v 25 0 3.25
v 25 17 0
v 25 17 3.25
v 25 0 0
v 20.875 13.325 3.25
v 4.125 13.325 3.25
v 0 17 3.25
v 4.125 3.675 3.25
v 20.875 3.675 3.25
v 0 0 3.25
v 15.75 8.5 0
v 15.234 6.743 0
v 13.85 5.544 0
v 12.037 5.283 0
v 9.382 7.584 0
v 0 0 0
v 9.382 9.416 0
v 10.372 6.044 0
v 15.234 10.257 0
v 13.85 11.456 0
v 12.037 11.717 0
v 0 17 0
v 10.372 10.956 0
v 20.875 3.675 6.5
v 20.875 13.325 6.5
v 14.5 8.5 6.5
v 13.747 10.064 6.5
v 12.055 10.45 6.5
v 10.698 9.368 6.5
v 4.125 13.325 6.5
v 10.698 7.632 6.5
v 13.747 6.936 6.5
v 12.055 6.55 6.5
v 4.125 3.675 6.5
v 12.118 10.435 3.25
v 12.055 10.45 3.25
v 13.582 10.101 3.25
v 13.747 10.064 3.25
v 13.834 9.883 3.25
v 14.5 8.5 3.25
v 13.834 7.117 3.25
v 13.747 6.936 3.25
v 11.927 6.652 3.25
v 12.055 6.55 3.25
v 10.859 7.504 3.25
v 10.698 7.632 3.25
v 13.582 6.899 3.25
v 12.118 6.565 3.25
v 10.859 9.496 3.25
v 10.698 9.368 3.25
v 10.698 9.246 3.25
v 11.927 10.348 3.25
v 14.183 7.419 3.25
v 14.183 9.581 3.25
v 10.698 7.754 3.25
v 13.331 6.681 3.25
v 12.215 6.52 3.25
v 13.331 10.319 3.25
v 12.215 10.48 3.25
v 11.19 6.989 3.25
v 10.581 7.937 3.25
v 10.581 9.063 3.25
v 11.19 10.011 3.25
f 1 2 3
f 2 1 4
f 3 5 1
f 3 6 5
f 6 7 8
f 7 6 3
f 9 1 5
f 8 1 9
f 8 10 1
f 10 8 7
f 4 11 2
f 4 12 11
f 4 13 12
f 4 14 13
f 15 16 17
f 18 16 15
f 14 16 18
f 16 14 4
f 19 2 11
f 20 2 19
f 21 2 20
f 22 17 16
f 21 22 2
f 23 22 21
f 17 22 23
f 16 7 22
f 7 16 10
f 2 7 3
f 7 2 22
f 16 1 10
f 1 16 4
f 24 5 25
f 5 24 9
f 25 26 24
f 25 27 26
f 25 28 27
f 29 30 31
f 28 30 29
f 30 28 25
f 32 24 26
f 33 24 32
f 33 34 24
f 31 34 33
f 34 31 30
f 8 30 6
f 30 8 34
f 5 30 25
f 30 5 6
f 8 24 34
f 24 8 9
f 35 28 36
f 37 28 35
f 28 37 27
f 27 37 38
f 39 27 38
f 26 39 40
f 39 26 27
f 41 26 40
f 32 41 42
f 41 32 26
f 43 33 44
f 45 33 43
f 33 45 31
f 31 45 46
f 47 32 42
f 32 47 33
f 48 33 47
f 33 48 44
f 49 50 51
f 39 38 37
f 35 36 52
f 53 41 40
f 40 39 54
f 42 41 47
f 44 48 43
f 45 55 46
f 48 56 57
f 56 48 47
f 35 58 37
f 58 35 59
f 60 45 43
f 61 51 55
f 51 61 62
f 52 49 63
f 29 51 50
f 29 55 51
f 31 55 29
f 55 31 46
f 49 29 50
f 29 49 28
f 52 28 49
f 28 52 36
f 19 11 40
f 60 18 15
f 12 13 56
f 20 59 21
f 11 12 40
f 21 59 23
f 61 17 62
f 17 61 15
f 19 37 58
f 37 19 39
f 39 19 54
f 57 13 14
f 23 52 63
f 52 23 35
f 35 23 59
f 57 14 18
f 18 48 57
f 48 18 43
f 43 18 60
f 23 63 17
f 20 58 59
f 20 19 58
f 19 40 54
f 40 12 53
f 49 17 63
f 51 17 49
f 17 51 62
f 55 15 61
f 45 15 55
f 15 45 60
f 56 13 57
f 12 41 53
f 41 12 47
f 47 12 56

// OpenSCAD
// metal basket mount

hole_width = 16.75;
hole_height = 9.65;
hole_depth = 3.25;

screw_hole_radius = 2;

base_width = 25;
base_height = 17;

module outer_box()
{
	cube([base_width, base_height, hole_depth]);
}

module inner_box()
{
	translate([base_width/2-hole_width/2,base_height/2-hole_height/2,hole_depth])
	cube([hole_width, hole_height, hole_depth]);
}

module screw_hole_bottom()
{

	translate([base_width/2,base_height/2,0])
	cylinder(hole_depth, screw_hole_radius+1.25, screw_hole_radius);
}

module screw_hole_top()
{

	translate([base_width/2,base_height/2,hole_depth])
	cylinder(hole_depth, screw_hole_radius, screw_hole_radius);
}

module screw_holes()
{
	screw_hole_top();
	screw_hole_bottom();
}

module boxes()
{
	outer_box();
	inner_box();
}

difference()
{
	boxes();
	screw_holes();
}
